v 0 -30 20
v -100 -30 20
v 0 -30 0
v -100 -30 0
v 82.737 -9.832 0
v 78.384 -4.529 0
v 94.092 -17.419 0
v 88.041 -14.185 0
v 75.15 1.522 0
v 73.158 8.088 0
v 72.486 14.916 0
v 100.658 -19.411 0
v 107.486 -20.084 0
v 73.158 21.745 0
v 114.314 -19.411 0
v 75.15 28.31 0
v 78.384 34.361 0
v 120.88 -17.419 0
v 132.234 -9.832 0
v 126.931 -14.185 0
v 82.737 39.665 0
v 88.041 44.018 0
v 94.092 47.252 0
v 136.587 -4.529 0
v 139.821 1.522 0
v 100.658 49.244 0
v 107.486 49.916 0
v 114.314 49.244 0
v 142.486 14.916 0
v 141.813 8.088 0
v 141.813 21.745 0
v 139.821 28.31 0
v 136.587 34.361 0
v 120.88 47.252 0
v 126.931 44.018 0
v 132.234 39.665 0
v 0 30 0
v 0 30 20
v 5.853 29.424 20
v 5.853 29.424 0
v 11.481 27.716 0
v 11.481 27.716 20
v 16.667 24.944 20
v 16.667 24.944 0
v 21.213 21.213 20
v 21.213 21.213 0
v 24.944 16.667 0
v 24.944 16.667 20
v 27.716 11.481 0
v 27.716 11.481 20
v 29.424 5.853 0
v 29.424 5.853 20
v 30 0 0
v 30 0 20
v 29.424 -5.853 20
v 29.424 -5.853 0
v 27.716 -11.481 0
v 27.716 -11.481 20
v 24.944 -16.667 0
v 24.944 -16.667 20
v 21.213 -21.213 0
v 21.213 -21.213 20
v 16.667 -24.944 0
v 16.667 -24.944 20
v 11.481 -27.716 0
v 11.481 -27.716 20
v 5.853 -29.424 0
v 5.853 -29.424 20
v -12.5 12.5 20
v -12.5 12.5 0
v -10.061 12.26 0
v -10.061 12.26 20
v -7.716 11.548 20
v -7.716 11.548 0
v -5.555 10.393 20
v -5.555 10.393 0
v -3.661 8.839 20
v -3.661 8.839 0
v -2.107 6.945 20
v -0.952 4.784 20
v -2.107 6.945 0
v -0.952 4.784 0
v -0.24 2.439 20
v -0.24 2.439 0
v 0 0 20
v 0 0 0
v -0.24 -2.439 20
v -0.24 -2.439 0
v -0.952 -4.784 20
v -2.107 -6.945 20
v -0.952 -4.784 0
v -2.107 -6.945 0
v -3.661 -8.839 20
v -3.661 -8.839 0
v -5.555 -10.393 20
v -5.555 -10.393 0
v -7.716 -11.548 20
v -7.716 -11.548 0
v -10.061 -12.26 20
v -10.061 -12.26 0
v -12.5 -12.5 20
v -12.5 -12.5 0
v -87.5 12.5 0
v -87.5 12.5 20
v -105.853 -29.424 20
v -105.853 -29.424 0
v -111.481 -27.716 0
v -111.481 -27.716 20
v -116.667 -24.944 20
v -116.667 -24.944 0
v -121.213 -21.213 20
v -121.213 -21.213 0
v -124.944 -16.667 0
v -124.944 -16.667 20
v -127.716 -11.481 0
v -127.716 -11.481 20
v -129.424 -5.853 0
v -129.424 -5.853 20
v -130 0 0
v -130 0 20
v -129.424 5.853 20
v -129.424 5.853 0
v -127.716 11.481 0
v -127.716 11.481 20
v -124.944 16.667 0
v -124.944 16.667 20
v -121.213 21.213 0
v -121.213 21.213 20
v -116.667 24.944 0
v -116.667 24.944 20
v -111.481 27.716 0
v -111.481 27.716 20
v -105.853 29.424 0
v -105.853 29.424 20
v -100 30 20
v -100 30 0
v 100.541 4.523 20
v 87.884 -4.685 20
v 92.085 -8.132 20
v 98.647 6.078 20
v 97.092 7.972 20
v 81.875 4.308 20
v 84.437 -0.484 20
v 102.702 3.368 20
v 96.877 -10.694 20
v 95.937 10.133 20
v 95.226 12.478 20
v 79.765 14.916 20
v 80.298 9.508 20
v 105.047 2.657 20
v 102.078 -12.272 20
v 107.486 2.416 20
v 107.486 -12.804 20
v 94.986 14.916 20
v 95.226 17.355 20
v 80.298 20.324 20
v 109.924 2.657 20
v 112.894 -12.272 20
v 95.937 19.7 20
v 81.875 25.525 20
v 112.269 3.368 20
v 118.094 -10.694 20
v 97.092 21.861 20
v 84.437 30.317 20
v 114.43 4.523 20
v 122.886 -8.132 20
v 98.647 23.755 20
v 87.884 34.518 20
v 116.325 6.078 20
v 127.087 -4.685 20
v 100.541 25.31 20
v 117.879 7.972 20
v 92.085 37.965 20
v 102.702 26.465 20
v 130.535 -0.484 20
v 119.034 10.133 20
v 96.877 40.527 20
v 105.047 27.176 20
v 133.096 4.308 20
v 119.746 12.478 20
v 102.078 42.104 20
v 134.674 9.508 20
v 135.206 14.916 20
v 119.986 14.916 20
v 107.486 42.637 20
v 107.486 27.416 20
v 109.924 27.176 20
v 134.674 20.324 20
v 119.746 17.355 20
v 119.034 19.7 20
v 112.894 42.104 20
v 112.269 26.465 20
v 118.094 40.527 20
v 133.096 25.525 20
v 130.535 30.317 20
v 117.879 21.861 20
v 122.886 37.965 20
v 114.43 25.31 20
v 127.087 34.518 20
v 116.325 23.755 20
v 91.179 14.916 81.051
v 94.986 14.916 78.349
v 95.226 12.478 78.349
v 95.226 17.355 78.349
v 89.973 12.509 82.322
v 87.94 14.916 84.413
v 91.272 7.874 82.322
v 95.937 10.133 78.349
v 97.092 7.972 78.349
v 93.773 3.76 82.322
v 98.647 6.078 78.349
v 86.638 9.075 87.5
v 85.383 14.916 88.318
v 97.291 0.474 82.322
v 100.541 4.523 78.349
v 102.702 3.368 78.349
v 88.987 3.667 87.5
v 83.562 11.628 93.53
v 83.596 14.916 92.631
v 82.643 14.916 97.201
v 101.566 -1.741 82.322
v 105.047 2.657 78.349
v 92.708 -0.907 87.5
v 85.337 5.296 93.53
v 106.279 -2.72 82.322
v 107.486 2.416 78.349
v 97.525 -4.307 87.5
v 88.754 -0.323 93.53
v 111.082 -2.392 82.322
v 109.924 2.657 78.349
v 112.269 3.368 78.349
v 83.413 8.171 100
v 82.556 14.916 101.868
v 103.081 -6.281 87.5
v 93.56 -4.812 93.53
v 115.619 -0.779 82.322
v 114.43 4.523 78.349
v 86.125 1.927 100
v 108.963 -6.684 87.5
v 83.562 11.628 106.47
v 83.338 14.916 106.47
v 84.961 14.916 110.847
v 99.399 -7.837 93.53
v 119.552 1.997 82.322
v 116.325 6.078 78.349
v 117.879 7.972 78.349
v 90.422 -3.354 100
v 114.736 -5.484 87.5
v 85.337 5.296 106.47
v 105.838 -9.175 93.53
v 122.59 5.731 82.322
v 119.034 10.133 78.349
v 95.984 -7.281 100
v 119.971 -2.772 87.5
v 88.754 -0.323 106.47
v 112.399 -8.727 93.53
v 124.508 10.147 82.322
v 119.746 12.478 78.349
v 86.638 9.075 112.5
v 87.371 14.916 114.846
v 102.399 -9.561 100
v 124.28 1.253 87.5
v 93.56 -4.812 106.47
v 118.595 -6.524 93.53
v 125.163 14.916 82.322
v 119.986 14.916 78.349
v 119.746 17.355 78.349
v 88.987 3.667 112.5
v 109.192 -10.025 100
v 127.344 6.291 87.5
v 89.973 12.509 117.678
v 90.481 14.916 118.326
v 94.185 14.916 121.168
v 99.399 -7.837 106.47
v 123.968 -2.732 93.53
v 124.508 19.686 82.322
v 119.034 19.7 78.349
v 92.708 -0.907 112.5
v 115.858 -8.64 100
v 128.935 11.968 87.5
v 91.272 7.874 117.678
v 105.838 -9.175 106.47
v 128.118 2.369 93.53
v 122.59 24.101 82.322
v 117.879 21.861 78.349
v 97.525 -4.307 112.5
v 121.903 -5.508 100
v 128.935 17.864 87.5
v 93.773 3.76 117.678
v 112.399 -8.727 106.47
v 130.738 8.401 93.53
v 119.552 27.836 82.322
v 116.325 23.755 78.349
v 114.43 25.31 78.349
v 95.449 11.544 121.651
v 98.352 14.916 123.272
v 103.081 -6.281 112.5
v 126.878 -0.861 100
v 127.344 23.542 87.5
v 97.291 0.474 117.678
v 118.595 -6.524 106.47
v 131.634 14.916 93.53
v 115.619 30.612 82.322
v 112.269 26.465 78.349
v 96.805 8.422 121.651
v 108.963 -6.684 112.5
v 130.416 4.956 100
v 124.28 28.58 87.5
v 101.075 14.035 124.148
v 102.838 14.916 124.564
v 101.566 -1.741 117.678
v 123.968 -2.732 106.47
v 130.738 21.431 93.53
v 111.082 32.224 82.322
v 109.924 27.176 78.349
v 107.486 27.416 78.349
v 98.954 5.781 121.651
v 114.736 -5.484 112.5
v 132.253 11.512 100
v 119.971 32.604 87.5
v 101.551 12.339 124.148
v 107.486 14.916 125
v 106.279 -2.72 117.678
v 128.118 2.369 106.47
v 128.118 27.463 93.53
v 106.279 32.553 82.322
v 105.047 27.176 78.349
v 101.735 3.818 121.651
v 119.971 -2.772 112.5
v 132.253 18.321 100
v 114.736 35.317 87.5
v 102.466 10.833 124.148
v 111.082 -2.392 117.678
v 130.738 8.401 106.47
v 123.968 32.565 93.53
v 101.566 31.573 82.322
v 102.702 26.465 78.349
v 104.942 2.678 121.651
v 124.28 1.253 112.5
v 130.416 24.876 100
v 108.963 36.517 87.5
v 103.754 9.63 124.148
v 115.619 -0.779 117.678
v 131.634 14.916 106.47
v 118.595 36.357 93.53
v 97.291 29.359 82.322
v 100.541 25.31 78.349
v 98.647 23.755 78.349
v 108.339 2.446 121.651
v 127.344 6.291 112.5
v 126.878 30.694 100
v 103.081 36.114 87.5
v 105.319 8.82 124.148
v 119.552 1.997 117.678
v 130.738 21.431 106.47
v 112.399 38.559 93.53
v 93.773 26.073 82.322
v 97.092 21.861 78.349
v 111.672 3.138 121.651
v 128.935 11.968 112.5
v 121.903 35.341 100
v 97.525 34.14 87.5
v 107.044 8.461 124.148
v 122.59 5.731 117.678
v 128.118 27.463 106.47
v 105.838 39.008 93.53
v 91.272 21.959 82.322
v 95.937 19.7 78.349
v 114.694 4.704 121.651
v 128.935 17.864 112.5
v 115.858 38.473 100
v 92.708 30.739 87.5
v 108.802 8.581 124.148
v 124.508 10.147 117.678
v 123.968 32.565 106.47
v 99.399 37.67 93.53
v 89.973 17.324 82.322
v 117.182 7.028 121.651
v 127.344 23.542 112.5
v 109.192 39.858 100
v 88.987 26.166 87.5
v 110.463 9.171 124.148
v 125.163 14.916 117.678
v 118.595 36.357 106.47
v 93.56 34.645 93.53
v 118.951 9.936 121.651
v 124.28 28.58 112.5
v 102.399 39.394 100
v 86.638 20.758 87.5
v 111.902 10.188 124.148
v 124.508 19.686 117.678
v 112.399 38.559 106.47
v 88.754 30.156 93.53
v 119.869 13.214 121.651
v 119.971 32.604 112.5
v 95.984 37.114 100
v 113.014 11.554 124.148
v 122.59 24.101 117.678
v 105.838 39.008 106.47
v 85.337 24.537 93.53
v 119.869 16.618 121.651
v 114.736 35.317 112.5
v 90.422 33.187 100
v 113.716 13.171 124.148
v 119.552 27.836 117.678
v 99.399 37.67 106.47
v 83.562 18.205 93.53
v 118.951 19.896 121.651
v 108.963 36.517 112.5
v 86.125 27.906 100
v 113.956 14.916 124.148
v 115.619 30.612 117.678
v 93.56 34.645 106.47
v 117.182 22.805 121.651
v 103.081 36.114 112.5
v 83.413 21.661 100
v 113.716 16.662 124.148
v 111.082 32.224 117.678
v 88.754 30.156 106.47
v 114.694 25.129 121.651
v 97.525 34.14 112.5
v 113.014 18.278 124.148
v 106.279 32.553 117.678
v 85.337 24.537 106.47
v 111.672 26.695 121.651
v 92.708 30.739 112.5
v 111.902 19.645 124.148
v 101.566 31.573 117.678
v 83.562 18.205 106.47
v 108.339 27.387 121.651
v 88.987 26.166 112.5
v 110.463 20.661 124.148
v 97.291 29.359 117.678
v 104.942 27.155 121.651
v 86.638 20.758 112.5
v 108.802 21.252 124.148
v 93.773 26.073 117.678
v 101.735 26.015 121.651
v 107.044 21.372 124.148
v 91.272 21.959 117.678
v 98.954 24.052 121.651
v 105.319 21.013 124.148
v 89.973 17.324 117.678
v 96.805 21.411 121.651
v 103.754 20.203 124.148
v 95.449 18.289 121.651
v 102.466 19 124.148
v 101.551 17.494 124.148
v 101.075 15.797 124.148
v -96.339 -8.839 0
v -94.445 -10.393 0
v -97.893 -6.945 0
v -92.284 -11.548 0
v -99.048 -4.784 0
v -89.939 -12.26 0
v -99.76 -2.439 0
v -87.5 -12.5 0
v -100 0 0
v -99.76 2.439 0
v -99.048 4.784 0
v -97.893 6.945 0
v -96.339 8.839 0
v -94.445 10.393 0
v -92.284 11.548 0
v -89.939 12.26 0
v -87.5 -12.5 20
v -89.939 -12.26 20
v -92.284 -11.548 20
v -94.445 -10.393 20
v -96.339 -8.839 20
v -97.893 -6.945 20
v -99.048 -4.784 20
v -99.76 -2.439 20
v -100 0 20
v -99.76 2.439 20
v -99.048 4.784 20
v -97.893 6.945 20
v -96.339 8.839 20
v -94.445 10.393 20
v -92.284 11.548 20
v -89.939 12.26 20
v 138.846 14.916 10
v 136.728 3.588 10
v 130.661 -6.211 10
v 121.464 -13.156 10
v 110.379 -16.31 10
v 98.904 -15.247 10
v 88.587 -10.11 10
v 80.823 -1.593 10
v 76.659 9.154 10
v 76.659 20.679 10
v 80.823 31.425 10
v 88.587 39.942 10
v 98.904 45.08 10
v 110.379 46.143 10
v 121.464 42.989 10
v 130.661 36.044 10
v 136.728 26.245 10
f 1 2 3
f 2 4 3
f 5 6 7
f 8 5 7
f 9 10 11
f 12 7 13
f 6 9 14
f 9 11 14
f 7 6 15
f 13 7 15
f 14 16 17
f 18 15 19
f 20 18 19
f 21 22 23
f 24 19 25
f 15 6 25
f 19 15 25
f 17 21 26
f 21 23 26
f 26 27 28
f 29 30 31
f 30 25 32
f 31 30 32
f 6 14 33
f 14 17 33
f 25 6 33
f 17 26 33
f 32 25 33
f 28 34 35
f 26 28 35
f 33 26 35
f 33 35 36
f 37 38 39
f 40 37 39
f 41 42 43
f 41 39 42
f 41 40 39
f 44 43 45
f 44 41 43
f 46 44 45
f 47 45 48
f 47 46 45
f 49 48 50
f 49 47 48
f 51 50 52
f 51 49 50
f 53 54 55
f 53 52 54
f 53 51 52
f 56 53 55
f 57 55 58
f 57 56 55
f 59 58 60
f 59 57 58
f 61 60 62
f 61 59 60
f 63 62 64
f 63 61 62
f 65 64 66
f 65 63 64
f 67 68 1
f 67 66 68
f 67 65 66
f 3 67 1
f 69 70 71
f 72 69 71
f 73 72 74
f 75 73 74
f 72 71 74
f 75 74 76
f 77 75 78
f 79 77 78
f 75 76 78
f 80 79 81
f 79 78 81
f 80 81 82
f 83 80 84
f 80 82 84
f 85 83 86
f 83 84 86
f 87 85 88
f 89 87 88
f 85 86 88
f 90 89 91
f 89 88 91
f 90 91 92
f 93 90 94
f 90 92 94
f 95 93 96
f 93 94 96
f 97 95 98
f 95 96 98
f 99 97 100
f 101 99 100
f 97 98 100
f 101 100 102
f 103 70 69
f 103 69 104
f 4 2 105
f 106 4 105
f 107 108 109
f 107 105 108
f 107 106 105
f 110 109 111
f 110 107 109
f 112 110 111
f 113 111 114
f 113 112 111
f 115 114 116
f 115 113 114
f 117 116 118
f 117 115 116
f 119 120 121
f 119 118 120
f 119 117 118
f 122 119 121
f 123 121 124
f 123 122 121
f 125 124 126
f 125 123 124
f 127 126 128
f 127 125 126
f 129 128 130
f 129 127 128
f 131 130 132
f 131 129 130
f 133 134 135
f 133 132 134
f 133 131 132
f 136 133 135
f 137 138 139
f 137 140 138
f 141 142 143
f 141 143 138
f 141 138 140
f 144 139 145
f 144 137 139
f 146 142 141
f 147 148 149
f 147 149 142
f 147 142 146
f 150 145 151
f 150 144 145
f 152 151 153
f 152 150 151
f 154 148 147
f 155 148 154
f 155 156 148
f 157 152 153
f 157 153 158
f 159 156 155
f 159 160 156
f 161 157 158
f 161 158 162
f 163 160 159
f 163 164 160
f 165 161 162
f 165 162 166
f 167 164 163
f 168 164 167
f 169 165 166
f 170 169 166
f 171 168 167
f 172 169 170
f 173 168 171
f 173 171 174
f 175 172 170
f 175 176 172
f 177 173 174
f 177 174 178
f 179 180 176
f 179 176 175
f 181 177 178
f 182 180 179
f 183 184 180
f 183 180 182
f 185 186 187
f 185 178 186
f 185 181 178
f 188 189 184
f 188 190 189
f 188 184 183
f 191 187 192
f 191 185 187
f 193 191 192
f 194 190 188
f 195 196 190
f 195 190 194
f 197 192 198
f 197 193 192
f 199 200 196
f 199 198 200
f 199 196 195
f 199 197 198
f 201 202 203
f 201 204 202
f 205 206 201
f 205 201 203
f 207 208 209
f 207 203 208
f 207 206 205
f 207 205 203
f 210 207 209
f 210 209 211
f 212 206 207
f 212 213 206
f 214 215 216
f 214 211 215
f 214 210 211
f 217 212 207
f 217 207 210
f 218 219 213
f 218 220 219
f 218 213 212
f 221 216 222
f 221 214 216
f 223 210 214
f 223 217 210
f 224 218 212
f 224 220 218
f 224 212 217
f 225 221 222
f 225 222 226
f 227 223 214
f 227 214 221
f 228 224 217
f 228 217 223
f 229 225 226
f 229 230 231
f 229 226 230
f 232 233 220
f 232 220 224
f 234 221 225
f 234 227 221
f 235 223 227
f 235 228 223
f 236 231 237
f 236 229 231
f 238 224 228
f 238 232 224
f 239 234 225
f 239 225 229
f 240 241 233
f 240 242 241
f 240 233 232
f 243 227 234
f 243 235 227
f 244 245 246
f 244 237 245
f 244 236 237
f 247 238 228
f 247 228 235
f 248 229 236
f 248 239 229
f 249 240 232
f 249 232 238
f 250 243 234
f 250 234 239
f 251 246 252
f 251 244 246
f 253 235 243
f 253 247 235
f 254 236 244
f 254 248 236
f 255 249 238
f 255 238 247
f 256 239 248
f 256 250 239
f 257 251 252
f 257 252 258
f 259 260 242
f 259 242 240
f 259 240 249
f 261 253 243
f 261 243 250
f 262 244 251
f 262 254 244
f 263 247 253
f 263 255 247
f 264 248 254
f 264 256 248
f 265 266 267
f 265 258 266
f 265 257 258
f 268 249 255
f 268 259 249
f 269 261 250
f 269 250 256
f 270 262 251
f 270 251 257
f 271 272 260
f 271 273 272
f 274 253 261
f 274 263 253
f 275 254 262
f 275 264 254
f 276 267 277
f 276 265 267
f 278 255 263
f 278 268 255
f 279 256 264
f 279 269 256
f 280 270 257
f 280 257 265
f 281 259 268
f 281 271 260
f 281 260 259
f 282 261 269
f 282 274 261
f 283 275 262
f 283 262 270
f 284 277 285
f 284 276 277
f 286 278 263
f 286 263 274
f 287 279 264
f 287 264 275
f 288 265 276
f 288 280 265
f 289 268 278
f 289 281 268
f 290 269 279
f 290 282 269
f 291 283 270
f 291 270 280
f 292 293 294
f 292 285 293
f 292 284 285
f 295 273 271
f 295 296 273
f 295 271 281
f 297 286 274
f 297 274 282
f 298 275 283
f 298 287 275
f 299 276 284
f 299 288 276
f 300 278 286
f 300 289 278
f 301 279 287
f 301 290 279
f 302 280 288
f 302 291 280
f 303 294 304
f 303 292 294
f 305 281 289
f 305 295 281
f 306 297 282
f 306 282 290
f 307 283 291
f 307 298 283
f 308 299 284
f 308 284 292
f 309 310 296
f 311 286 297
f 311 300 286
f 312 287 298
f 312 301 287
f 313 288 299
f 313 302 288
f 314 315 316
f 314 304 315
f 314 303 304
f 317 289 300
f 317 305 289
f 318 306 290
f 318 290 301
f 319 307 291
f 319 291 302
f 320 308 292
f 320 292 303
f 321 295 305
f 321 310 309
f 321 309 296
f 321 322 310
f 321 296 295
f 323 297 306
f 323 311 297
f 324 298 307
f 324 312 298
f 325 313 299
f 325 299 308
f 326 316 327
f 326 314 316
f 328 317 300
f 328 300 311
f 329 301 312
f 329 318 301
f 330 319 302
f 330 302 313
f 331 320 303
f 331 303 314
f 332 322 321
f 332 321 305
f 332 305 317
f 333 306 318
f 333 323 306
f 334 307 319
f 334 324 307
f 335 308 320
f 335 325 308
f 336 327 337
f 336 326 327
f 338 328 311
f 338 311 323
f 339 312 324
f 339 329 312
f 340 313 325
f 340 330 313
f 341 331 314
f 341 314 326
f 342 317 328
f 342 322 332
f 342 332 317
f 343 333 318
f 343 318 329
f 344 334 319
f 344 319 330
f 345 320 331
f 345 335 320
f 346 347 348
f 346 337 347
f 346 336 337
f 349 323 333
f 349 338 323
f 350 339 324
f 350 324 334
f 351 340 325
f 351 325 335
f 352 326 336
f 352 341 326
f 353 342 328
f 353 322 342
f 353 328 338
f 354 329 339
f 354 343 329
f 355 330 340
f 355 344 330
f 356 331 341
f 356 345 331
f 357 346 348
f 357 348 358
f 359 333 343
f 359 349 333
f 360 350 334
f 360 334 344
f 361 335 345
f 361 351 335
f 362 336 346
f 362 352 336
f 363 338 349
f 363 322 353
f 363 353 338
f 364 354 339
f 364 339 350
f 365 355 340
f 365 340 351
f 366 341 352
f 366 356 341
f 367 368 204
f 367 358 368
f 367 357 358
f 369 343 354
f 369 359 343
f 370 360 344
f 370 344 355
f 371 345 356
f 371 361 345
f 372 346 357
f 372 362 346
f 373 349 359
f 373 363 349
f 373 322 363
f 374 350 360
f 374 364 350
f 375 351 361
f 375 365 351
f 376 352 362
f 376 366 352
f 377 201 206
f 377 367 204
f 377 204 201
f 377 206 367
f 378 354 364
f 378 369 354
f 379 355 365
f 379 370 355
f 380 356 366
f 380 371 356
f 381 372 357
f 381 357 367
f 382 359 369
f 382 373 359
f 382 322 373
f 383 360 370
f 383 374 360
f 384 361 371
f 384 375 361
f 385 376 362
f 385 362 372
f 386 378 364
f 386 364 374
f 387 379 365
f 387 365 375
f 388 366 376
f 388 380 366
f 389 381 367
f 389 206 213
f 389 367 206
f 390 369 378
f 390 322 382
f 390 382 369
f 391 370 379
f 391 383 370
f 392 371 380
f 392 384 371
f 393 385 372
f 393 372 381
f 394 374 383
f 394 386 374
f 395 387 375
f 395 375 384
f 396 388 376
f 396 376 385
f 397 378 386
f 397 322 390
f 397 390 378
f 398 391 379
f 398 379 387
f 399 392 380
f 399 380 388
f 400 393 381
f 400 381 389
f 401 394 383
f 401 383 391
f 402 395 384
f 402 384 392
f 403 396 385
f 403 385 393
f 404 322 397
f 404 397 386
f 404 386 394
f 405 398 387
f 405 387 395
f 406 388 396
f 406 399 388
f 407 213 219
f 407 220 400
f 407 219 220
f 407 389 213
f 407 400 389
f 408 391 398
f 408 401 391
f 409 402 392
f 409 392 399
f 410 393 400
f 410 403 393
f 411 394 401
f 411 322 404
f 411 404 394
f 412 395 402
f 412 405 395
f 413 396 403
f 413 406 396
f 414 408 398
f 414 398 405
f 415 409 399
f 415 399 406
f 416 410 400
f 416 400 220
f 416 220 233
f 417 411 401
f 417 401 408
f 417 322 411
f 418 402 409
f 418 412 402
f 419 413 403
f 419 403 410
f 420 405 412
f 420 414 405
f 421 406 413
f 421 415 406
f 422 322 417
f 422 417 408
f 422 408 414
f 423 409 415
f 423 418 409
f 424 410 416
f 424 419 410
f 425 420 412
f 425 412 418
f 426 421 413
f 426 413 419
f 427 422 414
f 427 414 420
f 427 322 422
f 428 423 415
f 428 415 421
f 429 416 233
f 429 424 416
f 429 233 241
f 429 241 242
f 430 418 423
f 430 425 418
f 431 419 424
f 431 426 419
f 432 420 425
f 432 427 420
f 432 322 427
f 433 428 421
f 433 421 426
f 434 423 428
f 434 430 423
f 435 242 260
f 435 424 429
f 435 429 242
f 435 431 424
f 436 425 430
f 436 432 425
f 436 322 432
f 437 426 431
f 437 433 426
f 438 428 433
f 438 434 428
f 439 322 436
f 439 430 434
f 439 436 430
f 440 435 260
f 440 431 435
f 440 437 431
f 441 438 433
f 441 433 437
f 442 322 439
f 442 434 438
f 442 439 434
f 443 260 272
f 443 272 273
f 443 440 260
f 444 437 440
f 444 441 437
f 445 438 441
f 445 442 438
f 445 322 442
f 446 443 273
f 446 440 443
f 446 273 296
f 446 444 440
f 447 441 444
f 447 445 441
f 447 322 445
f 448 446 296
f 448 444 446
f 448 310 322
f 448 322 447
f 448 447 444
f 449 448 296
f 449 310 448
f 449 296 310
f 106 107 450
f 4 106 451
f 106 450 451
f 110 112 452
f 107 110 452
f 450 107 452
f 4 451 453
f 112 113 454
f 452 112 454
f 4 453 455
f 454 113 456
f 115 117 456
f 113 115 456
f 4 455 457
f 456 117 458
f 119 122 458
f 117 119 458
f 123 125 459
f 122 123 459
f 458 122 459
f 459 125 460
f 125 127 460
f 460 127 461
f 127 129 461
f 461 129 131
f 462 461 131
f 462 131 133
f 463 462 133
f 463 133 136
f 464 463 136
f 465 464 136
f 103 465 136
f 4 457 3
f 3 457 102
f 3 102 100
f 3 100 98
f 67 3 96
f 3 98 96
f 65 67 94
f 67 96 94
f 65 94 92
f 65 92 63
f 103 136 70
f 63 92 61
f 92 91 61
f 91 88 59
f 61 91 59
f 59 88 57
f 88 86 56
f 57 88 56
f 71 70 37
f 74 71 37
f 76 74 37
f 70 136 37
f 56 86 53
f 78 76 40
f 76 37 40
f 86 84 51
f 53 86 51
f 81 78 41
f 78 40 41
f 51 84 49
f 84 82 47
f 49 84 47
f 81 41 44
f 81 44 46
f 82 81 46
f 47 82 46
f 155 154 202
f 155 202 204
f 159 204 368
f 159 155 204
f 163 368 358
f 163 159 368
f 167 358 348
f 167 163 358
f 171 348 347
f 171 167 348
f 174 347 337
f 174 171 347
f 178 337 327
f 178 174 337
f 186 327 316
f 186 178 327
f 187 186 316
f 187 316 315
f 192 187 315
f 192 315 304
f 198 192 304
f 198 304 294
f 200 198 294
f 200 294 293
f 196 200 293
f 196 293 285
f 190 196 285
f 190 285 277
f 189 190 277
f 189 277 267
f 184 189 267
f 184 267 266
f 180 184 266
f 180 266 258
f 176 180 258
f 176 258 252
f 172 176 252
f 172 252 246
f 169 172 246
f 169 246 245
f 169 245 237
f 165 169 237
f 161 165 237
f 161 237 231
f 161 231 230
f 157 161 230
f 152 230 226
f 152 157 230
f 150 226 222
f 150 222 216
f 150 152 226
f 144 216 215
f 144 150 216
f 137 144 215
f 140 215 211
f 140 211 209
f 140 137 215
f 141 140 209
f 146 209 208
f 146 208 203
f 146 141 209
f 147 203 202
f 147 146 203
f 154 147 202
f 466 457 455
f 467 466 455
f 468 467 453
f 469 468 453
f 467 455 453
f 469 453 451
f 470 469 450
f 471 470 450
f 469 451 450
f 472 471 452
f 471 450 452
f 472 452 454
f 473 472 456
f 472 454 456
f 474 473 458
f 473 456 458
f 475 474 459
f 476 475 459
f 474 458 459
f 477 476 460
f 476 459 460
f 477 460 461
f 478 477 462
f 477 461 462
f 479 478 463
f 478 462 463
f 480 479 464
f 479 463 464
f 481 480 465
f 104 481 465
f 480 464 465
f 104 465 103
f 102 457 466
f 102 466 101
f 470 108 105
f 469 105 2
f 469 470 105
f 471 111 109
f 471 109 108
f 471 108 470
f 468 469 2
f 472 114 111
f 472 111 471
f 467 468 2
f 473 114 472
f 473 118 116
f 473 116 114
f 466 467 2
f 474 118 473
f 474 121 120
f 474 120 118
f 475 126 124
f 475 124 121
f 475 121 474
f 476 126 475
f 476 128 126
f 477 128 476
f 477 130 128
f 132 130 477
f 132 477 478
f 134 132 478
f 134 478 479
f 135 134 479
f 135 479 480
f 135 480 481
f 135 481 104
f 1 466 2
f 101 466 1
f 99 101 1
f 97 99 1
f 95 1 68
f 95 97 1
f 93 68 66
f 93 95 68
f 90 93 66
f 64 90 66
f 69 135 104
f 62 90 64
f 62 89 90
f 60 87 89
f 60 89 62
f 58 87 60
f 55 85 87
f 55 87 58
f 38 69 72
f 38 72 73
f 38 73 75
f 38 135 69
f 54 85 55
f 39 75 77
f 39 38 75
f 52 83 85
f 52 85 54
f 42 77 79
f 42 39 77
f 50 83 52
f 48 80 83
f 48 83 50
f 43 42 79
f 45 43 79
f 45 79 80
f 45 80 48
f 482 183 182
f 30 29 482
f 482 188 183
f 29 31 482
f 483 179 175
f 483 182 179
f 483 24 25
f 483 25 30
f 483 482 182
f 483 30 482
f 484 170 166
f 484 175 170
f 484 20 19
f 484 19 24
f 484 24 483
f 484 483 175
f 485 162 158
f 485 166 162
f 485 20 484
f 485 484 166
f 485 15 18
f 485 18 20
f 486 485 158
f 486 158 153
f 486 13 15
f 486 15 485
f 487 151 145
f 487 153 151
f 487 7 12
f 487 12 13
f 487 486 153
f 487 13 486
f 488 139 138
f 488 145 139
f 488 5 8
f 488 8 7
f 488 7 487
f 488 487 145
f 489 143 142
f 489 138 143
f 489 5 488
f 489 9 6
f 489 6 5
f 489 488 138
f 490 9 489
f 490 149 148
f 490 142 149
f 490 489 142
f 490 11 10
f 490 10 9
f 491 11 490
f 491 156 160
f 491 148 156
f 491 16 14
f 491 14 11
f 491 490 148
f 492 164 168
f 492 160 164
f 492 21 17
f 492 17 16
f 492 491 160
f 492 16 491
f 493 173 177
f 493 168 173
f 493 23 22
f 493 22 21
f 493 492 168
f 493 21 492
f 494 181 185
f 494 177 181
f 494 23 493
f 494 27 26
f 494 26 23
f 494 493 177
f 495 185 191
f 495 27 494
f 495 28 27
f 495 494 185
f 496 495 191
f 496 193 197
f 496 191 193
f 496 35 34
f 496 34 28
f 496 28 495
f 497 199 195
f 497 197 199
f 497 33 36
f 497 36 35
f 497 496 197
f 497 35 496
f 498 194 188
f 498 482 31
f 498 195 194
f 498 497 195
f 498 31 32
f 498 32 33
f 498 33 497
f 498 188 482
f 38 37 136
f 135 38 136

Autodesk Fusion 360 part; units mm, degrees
sketch "草图1" plane through (0, 0, 0) normal (0, 0, 1) x (1, 0, 0)
  line L0 (0, 30) -> (-100, 30)
  arc A0 (-100, 30) -> (-100, -30) centre (-100, 0) ccw
  line L1 (-100, -30) -> (0, -30)
  arc A1 (0, -30) -> (0, 30) centre (0, 0) ccw
  line L2 (0, 0) -> (-100, 0) construction
  dimension "d1" = 60
extrude "拉伸1" add sketch "草图1" along normal blind 20 makes body 1
sketch "草图2" plane through (0, 0, 20) normal (0, 0, 1) x (-1, 0, 0)
  arc A0 (0, 30) -> (0, -30) centre (0, 0) ccw
  line L0 (0, -30) -> (100, -30)
  arc A1 (100, -30) -> (100, 30) centre (100, 0) ccw
  line L1 (100, 30) -> (0, 30)
  line L2 (12.5, -12.5) -> (87.5, -12.5)
  arc A2 (87.5, -12.5) -> (87.5, 12.5) centre (87.5, 0) ccw
  line L3 (87.5, 12.5) -> (12.5, 12.5)
  arc A3 (12.5, 12.5) -> (12.5, -12.5) centre (12.5, 0) ccw
  line L4 (0, 0) -> (100, 0) construction
  dimension "d4" = 25
extrude "拉伸2" cut sketch "草图2" along normal through all and the other way through all contours L2 A2 L3 A3 bodies 1
sketch "草图3" plane through (0, 0, 0) normal (0, 0, 1) x (1, 0, 0)
  circle A0 centre (107.4857, 14.9164) radius 35
  dimension "d7" = 70
extrude "拉伸1'" add sketch "草图3" along normal blind 20 draft -20 separate body makes body 2 in component "handle"
sketch "草图4" plane through (0, 0, 20) normal (0, 0, 1) x (-1, 0, 0)
  circle A0 centre (-107.4857, -14.9164) radius 27.7206
  circle A1 centre (-107.4857, -14.9164) radius 12.5
  dimension "d10" = 25
extrude "拉伸2'" add sketch "草图4" along normal blind 80 contours A1 bodies 2 in component "handle"
sphere "球体基本要素1" add diameter 50 placed x (-1, 0, 0) y (0, -1, 0) z (0, 0, 1) at (107.4857, 14.9164, 100) bodies 2 in component "handle"
component "handle" placed x (1, 0, 0) y (0, 1, 0) z (0, 0, 1) at (0, 0, 0)
